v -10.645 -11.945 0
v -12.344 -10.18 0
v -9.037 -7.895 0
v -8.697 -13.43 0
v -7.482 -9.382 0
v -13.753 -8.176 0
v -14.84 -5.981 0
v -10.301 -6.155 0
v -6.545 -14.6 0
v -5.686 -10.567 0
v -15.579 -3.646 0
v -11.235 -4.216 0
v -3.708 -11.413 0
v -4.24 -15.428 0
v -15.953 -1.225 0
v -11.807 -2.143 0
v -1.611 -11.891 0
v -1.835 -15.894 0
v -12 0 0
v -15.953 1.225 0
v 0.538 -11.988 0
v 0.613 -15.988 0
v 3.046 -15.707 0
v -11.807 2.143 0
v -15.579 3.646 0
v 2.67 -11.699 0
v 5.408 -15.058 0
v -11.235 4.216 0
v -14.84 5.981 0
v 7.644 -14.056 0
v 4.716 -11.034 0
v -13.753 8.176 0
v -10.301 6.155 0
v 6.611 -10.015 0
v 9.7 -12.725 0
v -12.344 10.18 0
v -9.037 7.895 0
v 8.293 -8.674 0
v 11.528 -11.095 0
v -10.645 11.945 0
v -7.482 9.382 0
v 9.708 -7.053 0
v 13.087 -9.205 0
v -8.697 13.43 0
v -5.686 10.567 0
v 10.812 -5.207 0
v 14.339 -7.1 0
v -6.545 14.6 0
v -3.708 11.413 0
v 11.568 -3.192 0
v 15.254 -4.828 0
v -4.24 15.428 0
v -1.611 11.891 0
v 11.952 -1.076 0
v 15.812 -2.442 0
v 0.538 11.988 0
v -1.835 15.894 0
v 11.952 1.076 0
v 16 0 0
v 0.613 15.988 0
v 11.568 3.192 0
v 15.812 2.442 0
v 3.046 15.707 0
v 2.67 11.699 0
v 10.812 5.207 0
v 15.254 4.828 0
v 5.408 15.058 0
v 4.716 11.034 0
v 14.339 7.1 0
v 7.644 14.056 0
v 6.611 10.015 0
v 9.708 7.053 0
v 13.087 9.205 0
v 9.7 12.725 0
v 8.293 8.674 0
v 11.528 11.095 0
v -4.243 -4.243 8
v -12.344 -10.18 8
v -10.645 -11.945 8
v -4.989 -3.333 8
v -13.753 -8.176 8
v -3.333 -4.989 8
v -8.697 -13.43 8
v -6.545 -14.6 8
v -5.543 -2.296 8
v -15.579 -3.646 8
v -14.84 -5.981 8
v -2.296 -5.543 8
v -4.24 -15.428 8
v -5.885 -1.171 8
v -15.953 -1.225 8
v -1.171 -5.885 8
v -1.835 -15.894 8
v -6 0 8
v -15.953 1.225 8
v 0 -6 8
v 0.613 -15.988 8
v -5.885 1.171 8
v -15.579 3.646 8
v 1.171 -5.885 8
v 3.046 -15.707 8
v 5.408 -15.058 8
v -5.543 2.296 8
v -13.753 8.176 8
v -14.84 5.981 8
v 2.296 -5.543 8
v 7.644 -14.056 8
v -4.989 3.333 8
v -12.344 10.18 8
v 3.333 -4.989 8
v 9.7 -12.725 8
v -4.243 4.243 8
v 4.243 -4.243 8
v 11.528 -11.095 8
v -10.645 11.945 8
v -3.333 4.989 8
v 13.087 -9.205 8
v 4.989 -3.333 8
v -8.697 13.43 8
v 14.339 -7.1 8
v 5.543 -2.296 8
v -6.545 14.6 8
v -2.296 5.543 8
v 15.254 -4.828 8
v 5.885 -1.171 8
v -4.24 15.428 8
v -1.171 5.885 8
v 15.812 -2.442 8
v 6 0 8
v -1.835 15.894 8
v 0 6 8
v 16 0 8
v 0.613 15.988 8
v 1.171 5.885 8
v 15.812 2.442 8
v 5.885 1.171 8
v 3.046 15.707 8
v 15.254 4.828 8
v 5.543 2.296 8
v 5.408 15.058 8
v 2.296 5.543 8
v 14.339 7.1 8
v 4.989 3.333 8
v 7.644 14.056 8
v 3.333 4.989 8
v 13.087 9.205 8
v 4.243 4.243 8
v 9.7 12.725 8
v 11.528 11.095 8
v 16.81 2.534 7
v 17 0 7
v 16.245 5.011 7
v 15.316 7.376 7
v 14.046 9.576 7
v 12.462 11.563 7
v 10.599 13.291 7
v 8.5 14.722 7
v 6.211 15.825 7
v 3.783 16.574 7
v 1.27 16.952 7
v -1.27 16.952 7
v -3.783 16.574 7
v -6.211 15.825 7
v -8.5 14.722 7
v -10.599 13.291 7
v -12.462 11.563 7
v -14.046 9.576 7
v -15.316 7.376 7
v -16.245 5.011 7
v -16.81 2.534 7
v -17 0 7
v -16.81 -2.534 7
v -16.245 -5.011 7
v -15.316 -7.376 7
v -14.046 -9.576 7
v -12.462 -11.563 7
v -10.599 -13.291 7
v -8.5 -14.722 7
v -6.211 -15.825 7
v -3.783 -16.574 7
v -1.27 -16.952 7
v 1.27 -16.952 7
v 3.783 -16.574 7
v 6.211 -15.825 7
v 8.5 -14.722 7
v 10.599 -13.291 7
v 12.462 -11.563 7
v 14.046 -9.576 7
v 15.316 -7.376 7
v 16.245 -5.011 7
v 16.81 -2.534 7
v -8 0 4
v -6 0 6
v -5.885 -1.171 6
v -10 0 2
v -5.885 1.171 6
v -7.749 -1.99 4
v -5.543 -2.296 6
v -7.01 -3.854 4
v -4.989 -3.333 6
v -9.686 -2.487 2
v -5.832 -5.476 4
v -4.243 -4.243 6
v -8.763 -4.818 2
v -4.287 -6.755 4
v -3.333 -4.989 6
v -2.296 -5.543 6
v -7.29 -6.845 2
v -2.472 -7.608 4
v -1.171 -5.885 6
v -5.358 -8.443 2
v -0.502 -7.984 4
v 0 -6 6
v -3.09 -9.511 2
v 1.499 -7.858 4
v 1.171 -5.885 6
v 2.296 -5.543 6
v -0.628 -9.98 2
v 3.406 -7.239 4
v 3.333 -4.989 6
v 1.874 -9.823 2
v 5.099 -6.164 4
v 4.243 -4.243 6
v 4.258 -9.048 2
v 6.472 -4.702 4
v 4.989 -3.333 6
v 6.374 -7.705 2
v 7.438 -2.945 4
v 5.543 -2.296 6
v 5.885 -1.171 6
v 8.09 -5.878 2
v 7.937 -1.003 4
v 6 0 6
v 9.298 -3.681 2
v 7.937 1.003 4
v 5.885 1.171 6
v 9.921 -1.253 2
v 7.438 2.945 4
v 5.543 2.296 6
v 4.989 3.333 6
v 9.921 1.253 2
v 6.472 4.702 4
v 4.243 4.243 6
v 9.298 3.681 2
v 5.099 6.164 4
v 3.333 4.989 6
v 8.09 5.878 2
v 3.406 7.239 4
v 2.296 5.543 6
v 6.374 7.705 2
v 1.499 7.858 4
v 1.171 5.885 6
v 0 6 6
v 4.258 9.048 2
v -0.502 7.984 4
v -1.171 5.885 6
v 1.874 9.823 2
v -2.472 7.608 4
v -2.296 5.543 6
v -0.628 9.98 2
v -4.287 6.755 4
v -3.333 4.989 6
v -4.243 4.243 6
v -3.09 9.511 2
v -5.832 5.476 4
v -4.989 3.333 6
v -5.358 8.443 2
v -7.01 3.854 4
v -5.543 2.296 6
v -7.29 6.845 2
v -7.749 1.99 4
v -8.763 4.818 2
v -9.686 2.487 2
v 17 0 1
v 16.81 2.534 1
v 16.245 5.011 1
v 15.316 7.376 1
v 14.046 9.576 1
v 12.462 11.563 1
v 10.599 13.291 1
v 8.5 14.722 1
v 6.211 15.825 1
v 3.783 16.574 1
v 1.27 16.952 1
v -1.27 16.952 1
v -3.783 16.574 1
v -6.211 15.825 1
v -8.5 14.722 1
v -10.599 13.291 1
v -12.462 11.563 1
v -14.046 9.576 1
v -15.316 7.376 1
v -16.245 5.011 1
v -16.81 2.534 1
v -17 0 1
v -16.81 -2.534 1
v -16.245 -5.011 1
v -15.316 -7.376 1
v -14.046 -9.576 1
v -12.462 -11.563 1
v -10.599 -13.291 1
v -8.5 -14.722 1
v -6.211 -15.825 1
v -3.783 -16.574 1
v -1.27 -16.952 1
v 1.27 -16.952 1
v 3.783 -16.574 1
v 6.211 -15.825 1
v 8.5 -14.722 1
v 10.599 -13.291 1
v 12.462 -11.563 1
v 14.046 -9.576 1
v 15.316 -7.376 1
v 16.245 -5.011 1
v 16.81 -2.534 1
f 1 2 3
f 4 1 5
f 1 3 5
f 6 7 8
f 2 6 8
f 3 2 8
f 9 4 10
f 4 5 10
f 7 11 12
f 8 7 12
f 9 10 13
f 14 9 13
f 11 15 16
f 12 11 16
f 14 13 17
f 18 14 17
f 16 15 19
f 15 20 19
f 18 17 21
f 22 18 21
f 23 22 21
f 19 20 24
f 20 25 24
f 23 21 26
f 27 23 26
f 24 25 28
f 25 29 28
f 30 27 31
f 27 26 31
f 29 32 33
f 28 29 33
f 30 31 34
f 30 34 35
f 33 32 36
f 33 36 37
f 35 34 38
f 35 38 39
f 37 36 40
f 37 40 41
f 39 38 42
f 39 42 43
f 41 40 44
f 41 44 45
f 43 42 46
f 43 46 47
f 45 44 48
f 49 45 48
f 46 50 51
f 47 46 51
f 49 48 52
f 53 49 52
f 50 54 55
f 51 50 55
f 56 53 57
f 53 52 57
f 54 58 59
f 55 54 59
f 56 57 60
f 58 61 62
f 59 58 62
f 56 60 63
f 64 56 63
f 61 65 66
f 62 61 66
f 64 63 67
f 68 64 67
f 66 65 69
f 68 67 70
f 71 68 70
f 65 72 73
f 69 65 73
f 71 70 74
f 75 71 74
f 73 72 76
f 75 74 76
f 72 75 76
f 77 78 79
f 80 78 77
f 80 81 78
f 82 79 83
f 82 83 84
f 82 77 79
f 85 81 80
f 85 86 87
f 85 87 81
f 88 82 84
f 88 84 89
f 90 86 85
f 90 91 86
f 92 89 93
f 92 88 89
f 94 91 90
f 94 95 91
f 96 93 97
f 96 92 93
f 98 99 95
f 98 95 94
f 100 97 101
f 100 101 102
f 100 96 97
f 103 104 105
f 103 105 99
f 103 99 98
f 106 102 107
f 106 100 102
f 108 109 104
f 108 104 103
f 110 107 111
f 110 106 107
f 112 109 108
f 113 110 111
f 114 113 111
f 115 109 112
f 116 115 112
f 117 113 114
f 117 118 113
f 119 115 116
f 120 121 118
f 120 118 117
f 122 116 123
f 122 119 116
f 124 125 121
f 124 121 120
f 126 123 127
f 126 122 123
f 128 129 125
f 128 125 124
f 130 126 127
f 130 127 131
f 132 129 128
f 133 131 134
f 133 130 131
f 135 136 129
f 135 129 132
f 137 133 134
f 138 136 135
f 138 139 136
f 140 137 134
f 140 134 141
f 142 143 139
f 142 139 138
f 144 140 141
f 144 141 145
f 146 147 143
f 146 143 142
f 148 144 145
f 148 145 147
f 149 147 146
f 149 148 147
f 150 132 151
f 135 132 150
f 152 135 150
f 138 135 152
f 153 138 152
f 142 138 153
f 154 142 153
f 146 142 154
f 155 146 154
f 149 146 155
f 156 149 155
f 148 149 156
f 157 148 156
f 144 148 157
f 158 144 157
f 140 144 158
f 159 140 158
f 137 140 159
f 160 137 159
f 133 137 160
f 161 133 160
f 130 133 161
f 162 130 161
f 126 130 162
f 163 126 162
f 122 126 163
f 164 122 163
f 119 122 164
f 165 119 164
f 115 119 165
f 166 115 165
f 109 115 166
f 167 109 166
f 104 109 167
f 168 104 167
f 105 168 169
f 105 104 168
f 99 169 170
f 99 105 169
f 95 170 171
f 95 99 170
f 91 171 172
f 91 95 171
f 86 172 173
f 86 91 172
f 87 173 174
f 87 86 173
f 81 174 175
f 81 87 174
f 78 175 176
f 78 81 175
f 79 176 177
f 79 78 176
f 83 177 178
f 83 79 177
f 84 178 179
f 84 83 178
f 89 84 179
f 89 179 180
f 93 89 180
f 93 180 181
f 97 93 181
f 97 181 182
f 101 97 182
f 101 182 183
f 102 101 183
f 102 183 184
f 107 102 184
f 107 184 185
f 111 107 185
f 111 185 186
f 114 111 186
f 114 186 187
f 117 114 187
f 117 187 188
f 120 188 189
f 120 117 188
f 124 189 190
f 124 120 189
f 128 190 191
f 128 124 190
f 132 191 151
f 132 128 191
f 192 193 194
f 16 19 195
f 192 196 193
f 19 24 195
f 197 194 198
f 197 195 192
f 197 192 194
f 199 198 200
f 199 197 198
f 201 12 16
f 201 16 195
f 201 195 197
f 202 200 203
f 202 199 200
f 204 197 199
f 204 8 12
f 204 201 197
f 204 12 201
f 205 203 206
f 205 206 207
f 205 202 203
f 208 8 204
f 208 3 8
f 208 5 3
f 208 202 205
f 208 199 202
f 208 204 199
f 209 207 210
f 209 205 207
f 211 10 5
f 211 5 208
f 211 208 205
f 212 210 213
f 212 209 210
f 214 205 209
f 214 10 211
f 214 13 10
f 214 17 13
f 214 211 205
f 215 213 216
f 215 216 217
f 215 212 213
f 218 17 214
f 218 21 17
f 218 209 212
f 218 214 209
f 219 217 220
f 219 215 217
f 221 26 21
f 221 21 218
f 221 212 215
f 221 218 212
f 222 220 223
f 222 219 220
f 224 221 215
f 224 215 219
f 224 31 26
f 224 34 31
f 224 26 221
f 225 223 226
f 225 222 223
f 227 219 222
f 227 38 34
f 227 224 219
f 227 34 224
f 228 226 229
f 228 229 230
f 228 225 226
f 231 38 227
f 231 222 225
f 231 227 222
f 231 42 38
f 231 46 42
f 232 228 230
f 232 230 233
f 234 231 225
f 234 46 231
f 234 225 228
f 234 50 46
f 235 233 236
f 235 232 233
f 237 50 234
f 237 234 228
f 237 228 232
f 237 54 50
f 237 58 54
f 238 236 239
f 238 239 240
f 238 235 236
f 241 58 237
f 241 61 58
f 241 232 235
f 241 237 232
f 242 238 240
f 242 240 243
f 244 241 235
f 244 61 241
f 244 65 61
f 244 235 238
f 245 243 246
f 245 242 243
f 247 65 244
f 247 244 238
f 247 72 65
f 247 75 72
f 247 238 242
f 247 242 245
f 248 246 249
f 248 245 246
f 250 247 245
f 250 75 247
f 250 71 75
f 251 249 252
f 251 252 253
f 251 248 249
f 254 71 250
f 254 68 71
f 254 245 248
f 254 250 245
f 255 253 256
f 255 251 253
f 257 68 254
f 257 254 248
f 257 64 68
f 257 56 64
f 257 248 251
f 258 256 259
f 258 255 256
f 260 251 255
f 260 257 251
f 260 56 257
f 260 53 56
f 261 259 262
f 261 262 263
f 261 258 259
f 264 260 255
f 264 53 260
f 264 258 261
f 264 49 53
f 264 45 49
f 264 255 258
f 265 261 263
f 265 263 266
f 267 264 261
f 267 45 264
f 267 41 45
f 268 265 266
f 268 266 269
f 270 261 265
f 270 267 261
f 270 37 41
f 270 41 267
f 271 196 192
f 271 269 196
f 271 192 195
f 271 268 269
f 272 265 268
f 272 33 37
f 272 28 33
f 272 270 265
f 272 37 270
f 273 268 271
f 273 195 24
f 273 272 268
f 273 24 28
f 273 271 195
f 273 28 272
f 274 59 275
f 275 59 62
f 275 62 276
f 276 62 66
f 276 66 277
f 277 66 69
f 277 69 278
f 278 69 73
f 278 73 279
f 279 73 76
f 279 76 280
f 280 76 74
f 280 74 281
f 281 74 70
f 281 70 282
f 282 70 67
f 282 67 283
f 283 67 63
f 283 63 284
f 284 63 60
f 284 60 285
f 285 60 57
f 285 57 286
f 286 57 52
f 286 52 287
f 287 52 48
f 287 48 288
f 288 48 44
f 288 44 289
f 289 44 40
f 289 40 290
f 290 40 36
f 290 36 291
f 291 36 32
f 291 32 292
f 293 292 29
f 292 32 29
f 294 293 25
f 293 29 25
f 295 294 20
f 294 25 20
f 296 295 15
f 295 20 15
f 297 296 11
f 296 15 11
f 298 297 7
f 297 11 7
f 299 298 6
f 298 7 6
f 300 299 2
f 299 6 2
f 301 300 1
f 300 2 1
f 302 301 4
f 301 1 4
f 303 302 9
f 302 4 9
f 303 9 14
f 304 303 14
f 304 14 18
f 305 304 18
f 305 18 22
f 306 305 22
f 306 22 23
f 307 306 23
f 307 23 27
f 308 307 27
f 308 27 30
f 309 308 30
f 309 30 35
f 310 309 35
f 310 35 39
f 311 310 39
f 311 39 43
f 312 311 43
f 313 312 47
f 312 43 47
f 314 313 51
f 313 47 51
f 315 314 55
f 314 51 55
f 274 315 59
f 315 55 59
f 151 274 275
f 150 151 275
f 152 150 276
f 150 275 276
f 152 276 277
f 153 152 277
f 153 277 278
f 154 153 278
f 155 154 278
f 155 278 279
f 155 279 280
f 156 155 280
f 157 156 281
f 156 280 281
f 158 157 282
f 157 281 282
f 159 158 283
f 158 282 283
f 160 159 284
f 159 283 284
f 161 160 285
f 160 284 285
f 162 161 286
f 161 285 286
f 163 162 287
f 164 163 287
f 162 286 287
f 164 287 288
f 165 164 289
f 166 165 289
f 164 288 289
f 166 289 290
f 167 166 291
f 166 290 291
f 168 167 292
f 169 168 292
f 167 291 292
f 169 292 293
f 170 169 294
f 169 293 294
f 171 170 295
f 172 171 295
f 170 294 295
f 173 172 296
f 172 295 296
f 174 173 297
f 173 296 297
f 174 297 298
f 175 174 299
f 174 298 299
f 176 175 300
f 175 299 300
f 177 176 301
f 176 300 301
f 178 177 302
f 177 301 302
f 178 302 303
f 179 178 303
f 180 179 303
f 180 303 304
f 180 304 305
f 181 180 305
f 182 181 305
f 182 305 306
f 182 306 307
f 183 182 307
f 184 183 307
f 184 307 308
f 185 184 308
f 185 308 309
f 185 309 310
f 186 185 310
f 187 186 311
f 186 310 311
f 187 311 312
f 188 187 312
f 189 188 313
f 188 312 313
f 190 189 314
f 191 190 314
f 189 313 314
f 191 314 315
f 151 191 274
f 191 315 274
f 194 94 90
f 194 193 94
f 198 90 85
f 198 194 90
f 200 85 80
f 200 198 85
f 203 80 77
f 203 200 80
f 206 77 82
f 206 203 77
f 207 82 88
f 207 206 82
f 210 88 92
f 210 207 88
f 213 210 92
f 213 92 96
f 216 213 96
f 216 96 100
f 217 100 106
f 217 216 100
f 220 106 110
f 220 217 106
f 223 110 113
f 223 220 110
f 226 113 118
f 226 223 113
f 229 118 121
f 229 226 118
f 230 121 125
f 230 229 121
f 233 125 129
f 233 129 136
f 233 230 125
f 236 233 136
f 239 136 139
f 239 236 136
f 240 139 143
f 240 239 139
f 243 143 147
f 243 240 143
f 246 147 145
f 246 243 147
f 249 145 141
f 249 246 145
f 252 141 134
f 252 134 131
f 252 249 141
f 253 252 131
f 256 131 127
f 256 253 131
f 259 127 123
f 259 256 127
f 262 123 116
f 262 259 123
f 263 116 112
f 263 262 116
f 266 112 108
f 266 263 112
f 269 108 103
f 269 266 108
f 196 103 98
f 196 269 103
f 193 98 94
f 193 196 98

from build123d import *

# Parameters (mm, degrees)
SKETCH1_R           = 17
BOSS_EXTRUDE2_DEPTH = 8
CHAMFER1_SIZE       = 1


with BuildPart() as part:
    # Sketch1 → Boss-Extrude2 (new body)
    with BuildSketch(Plane.XY):
        Circle(SKETCH1_R)
    extrude(amount=BOSS_EXTRUDE2_DEPTH)

    # Sketch3 → Cut-Revolve2 (revolve, cut)
    with BuildSketch(Plane(origin=(0, 0, 0), x_dir=(1, 0, 0), z_dir=(0, 1, 0)), mode=Mode.PRIVATE) as cut_revolve2_sk:
        Polygon((0, 0), (0, -8), (6, -8), (6, -6), (12, 0), align=None)
    revolve(cut_revolve2_sk.sketch.rotate(Axis((0, 0, 0), (0, 0, 1)), 180), axis=Axis((0, 0, 0), (0, 0, 1)), mode=Mode.SUBTRACT)

    # Chamfer1
    chamfer1_edges = [part.edges().sort_by_distance(p)[0] for p in [
        (-17, 0, 0),
        (-17, 0, 8),
    ]]
    chamfer(chamfer1_edges, length=CHAMFER1_SIZE)


solid = part.part
